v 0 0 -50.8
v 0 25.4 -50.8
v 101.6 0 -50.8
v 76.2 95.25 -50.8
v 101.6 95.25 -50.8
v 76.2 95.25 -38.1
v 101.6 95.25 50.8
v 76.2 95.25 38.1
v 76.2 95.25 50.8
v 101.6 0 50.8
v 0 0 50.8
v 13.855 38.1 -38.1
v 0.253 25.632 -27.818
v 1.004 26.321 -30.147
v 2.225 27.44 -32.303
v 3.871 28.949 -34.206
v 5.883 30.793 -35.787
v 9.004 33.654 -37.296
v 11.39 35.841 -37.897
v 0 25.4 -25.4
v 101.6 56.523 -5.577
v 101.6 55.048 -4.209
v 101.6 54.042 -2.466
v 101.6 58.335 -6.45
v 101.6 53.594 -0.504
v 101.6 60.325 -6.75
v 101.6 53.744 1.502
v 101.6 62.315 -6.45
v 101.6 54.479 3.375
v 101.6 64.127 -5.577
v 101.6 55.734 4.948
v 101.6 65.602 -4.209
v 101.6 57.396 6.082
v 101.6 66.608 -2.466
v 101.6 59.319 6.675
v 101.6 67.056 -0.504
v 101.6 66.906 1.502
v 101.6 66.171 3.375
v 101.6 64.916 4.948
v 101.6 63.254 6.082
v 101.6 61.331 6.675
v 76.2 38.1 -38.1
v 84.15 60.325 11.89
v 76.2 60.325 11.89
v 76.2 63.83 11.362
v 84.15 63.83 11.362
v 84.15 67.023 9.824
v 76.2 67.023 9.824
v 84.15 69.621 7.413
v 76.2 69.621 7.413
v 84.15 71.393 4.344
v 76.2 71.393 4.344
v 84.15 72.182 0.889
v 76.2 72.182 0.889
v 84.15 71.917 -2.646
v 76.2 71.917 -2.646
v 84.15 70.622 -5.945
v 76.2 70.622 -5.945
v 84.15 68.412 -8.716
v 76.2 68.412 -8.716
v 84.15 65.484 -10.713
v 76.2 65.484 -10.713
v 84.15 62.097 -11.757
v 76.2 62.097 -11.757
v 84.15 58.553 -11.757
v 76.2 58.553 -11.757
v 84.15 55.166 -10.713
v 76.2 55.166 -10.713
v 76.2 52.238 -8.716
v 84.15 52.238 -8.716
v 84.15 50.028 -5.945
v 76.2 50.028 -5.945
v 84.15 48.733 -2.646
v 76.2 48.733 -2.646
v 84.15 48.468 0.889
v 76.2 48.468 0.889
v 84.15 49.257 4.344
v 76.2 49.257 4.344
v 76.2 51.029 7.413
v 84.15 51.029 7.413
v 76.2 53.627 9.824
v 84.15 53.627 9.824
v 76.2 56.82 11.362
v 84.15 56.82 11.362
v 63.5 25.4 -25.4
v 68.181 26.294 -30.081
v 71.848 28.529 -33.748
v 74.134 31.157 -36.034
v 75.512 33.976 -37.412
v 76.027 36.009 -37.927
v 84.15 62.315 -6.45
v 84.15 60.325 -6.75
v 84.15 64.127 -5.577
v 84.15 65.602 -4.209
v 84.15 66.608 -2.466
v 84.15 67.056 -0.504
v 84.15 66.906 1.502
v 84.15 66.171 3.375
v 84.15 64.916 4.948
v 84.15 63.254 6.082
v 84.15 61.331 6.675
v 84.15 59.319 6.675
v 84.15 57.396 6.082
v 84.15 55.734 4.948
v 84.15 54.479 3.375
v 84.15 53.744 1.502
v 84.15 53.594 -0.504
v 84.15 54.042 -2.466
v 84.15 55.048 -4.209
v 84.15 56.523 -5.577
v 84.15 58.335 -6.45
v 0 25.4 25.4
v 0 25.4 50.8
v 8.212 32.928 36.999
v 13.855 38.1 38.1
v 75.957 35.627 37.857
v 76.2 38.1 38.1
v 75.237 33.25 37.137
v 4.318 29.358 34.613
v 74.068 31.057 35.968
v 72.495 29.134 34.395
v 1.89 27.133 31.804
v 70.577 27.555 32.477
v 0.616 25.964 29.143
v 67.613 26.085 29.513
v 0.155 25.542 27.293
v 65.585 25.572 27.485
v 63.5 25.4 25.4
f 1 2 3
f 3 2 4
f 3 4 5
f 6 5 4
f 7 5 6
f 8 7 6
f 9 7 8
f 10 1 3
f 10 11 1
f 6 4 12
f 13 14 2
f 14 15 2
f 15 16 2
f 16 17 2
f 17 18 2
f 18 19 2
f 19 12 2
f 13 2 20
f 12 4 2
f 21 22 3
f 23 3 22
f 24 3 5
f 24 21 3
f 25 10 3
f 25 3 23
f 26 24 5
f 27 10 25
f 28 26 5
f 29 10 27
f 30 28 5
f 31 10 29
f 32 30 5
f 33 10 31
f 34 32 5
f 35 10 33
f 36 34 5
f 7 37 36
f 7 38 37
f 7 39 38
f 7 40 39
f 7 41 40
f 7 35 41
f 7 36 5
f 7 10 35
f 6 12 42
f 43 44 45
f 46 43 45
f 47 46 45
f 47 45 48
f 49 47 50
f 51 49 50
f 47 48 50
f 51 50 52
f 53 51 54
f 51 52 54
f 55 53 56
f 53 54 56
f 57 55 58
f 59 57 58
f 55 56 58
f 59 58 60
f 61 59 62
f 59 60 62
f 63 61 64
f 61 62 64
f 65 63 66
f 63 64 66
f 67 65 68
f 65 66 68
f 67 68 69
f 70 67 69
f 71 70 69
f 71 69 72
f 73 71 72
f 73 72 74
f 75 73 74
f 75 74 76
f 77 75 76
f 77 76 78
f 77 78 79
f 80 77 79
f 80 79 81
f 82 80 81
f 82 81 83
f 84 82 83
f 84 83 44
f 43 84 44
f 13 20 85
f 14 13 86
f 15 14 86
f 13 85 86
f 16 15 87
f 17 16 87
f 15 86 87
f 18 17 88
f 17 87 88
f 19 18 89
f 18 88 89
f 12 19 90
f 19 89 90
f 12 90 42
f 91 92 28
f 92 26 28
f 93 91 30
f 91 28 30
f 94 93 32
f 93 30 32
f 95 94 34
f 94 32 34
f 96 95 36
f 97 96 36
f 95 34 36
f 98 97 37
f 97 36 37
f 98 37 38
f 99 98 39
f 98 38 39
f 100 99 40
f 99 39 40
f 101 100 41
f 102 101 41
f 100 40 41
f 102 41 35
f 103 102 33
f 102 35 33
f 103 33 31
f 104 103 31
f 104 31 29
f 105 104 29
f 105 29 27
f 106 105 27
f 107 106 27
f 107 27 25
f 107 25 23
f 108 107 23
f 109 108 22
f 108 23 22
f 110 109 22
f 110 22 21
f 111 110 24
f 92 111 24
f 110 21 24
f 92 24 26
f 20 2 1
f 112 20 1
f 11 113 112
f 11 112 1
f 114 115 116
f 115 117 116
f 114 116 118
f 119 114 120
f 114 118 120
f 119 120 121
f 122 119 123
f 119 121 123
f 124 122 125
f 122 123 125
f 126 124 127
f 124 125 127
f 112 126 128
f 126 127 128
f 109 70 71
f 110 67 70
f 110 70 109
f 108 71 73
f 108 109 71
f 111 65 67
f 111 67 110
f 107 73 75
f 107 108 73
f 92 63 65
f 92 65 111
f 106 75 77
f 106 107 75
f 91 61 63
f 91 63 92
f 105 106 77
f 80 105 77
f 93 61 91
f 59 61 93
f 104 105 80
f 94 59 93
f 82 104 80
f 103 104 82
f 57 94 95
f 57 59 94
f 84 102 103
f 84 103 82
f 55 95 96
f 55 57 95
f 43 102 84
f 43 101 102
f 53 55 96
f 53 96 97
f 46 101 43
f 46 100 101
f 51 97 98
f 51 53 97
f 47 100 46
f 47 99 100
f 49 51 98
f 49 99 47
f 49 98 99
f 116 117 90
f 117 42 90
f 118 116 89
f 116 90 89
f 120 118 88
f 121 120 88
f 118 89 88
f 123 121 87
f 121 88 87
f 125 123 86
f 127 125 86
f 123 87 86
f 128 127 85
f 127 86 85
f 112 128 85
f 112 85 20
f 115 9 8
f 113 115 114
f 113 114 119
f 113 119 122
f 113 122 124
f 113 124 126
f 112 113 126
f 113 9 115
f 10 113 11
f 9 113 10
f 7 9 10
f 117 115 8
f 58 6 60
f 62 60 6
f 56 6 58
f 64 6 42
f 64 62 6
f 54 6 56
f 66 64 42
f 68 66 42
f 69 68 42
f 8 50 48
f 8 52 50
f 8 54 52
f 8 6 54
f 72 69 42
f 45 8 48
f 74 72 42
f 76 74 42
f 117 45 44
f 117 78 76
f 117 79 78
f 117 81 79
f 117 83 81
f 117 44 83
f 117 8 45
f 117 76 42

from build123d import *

# Parameters (mm, degrees)
BOSS_EXTRUDE1_DEPTH                      = 50.8
CBORE_FOR_M12_HEX_HEAD_BOLT1_D           = 13.5
CBORE_FOR_M12_HEX_HEAD_BOLT1_CBORE_D     = 23.78
CBORE_FOR_M12_HEX_HEAD_BOLT1_CBORE_DEPTH = 7.95
BOSS_EXTRUDE2_DEPTH                      = 12.7
FILLET1_R                                = 12.7


with BuildPart() as part:
    # Sketch1 → Boss-Extrude1 (new, symmetric)
    with BuildSketch(Plane.XY):
        Polygon((0, 0), (101.6, 0), (101.6, 25.4), (101.6, 95.25), (76.2, 95.25), (76.2, 25.4), (0, 25.4), align=None)
    extrude(amount=BOSS_EXTRUDE1_DEPTH, both=True)

    # CBORE for M12 Hex Head Bolt1 (through all)
    with Locations(Plane.ZY.offset(-76.2)):
        with Locations((0, 60.325)):
            CounterBoreHole(CBORE_FOR_M12_HEX_HEAD_BOLT1_D / 2, CBORE_FOR_M12_HEX_HEAD_BOLT1_CBORE_D / 2, CBORE_FOR_M12_HEX_HEAD_BOLT1_CBORE_DEPTH)

    # Sketch5 → Boss-Extrude2 (add)
    with BuildSketch(Plane(origin=(0, 0, -50.8), x_dir=(-1, 0, 0), z_dir=(0, 0, -1))):
        Polygon((-76.2, 95.25), (0, 25.4), (-76.2, 25.4), align=None)
    boss_extrude2 = extrude(amount=-BOSS_EXTRUDE2_DEPTH)

    # Mirror1: Boss-Extrude2 across plane
    add(boss_extrude2.mirror(Plane.XY))

    # Fillet1
    fillet1_edges = [part.edges().sort_by_distance(p)[0] for p in [
        (38.1, 25.4, -38.1),
        (76.2, 25.4, 0),
        (38.1, 25.4, 38.1),
    ]]
    fillet(fillet1_edges, radius=FILLET1_R)


solid = part.part
